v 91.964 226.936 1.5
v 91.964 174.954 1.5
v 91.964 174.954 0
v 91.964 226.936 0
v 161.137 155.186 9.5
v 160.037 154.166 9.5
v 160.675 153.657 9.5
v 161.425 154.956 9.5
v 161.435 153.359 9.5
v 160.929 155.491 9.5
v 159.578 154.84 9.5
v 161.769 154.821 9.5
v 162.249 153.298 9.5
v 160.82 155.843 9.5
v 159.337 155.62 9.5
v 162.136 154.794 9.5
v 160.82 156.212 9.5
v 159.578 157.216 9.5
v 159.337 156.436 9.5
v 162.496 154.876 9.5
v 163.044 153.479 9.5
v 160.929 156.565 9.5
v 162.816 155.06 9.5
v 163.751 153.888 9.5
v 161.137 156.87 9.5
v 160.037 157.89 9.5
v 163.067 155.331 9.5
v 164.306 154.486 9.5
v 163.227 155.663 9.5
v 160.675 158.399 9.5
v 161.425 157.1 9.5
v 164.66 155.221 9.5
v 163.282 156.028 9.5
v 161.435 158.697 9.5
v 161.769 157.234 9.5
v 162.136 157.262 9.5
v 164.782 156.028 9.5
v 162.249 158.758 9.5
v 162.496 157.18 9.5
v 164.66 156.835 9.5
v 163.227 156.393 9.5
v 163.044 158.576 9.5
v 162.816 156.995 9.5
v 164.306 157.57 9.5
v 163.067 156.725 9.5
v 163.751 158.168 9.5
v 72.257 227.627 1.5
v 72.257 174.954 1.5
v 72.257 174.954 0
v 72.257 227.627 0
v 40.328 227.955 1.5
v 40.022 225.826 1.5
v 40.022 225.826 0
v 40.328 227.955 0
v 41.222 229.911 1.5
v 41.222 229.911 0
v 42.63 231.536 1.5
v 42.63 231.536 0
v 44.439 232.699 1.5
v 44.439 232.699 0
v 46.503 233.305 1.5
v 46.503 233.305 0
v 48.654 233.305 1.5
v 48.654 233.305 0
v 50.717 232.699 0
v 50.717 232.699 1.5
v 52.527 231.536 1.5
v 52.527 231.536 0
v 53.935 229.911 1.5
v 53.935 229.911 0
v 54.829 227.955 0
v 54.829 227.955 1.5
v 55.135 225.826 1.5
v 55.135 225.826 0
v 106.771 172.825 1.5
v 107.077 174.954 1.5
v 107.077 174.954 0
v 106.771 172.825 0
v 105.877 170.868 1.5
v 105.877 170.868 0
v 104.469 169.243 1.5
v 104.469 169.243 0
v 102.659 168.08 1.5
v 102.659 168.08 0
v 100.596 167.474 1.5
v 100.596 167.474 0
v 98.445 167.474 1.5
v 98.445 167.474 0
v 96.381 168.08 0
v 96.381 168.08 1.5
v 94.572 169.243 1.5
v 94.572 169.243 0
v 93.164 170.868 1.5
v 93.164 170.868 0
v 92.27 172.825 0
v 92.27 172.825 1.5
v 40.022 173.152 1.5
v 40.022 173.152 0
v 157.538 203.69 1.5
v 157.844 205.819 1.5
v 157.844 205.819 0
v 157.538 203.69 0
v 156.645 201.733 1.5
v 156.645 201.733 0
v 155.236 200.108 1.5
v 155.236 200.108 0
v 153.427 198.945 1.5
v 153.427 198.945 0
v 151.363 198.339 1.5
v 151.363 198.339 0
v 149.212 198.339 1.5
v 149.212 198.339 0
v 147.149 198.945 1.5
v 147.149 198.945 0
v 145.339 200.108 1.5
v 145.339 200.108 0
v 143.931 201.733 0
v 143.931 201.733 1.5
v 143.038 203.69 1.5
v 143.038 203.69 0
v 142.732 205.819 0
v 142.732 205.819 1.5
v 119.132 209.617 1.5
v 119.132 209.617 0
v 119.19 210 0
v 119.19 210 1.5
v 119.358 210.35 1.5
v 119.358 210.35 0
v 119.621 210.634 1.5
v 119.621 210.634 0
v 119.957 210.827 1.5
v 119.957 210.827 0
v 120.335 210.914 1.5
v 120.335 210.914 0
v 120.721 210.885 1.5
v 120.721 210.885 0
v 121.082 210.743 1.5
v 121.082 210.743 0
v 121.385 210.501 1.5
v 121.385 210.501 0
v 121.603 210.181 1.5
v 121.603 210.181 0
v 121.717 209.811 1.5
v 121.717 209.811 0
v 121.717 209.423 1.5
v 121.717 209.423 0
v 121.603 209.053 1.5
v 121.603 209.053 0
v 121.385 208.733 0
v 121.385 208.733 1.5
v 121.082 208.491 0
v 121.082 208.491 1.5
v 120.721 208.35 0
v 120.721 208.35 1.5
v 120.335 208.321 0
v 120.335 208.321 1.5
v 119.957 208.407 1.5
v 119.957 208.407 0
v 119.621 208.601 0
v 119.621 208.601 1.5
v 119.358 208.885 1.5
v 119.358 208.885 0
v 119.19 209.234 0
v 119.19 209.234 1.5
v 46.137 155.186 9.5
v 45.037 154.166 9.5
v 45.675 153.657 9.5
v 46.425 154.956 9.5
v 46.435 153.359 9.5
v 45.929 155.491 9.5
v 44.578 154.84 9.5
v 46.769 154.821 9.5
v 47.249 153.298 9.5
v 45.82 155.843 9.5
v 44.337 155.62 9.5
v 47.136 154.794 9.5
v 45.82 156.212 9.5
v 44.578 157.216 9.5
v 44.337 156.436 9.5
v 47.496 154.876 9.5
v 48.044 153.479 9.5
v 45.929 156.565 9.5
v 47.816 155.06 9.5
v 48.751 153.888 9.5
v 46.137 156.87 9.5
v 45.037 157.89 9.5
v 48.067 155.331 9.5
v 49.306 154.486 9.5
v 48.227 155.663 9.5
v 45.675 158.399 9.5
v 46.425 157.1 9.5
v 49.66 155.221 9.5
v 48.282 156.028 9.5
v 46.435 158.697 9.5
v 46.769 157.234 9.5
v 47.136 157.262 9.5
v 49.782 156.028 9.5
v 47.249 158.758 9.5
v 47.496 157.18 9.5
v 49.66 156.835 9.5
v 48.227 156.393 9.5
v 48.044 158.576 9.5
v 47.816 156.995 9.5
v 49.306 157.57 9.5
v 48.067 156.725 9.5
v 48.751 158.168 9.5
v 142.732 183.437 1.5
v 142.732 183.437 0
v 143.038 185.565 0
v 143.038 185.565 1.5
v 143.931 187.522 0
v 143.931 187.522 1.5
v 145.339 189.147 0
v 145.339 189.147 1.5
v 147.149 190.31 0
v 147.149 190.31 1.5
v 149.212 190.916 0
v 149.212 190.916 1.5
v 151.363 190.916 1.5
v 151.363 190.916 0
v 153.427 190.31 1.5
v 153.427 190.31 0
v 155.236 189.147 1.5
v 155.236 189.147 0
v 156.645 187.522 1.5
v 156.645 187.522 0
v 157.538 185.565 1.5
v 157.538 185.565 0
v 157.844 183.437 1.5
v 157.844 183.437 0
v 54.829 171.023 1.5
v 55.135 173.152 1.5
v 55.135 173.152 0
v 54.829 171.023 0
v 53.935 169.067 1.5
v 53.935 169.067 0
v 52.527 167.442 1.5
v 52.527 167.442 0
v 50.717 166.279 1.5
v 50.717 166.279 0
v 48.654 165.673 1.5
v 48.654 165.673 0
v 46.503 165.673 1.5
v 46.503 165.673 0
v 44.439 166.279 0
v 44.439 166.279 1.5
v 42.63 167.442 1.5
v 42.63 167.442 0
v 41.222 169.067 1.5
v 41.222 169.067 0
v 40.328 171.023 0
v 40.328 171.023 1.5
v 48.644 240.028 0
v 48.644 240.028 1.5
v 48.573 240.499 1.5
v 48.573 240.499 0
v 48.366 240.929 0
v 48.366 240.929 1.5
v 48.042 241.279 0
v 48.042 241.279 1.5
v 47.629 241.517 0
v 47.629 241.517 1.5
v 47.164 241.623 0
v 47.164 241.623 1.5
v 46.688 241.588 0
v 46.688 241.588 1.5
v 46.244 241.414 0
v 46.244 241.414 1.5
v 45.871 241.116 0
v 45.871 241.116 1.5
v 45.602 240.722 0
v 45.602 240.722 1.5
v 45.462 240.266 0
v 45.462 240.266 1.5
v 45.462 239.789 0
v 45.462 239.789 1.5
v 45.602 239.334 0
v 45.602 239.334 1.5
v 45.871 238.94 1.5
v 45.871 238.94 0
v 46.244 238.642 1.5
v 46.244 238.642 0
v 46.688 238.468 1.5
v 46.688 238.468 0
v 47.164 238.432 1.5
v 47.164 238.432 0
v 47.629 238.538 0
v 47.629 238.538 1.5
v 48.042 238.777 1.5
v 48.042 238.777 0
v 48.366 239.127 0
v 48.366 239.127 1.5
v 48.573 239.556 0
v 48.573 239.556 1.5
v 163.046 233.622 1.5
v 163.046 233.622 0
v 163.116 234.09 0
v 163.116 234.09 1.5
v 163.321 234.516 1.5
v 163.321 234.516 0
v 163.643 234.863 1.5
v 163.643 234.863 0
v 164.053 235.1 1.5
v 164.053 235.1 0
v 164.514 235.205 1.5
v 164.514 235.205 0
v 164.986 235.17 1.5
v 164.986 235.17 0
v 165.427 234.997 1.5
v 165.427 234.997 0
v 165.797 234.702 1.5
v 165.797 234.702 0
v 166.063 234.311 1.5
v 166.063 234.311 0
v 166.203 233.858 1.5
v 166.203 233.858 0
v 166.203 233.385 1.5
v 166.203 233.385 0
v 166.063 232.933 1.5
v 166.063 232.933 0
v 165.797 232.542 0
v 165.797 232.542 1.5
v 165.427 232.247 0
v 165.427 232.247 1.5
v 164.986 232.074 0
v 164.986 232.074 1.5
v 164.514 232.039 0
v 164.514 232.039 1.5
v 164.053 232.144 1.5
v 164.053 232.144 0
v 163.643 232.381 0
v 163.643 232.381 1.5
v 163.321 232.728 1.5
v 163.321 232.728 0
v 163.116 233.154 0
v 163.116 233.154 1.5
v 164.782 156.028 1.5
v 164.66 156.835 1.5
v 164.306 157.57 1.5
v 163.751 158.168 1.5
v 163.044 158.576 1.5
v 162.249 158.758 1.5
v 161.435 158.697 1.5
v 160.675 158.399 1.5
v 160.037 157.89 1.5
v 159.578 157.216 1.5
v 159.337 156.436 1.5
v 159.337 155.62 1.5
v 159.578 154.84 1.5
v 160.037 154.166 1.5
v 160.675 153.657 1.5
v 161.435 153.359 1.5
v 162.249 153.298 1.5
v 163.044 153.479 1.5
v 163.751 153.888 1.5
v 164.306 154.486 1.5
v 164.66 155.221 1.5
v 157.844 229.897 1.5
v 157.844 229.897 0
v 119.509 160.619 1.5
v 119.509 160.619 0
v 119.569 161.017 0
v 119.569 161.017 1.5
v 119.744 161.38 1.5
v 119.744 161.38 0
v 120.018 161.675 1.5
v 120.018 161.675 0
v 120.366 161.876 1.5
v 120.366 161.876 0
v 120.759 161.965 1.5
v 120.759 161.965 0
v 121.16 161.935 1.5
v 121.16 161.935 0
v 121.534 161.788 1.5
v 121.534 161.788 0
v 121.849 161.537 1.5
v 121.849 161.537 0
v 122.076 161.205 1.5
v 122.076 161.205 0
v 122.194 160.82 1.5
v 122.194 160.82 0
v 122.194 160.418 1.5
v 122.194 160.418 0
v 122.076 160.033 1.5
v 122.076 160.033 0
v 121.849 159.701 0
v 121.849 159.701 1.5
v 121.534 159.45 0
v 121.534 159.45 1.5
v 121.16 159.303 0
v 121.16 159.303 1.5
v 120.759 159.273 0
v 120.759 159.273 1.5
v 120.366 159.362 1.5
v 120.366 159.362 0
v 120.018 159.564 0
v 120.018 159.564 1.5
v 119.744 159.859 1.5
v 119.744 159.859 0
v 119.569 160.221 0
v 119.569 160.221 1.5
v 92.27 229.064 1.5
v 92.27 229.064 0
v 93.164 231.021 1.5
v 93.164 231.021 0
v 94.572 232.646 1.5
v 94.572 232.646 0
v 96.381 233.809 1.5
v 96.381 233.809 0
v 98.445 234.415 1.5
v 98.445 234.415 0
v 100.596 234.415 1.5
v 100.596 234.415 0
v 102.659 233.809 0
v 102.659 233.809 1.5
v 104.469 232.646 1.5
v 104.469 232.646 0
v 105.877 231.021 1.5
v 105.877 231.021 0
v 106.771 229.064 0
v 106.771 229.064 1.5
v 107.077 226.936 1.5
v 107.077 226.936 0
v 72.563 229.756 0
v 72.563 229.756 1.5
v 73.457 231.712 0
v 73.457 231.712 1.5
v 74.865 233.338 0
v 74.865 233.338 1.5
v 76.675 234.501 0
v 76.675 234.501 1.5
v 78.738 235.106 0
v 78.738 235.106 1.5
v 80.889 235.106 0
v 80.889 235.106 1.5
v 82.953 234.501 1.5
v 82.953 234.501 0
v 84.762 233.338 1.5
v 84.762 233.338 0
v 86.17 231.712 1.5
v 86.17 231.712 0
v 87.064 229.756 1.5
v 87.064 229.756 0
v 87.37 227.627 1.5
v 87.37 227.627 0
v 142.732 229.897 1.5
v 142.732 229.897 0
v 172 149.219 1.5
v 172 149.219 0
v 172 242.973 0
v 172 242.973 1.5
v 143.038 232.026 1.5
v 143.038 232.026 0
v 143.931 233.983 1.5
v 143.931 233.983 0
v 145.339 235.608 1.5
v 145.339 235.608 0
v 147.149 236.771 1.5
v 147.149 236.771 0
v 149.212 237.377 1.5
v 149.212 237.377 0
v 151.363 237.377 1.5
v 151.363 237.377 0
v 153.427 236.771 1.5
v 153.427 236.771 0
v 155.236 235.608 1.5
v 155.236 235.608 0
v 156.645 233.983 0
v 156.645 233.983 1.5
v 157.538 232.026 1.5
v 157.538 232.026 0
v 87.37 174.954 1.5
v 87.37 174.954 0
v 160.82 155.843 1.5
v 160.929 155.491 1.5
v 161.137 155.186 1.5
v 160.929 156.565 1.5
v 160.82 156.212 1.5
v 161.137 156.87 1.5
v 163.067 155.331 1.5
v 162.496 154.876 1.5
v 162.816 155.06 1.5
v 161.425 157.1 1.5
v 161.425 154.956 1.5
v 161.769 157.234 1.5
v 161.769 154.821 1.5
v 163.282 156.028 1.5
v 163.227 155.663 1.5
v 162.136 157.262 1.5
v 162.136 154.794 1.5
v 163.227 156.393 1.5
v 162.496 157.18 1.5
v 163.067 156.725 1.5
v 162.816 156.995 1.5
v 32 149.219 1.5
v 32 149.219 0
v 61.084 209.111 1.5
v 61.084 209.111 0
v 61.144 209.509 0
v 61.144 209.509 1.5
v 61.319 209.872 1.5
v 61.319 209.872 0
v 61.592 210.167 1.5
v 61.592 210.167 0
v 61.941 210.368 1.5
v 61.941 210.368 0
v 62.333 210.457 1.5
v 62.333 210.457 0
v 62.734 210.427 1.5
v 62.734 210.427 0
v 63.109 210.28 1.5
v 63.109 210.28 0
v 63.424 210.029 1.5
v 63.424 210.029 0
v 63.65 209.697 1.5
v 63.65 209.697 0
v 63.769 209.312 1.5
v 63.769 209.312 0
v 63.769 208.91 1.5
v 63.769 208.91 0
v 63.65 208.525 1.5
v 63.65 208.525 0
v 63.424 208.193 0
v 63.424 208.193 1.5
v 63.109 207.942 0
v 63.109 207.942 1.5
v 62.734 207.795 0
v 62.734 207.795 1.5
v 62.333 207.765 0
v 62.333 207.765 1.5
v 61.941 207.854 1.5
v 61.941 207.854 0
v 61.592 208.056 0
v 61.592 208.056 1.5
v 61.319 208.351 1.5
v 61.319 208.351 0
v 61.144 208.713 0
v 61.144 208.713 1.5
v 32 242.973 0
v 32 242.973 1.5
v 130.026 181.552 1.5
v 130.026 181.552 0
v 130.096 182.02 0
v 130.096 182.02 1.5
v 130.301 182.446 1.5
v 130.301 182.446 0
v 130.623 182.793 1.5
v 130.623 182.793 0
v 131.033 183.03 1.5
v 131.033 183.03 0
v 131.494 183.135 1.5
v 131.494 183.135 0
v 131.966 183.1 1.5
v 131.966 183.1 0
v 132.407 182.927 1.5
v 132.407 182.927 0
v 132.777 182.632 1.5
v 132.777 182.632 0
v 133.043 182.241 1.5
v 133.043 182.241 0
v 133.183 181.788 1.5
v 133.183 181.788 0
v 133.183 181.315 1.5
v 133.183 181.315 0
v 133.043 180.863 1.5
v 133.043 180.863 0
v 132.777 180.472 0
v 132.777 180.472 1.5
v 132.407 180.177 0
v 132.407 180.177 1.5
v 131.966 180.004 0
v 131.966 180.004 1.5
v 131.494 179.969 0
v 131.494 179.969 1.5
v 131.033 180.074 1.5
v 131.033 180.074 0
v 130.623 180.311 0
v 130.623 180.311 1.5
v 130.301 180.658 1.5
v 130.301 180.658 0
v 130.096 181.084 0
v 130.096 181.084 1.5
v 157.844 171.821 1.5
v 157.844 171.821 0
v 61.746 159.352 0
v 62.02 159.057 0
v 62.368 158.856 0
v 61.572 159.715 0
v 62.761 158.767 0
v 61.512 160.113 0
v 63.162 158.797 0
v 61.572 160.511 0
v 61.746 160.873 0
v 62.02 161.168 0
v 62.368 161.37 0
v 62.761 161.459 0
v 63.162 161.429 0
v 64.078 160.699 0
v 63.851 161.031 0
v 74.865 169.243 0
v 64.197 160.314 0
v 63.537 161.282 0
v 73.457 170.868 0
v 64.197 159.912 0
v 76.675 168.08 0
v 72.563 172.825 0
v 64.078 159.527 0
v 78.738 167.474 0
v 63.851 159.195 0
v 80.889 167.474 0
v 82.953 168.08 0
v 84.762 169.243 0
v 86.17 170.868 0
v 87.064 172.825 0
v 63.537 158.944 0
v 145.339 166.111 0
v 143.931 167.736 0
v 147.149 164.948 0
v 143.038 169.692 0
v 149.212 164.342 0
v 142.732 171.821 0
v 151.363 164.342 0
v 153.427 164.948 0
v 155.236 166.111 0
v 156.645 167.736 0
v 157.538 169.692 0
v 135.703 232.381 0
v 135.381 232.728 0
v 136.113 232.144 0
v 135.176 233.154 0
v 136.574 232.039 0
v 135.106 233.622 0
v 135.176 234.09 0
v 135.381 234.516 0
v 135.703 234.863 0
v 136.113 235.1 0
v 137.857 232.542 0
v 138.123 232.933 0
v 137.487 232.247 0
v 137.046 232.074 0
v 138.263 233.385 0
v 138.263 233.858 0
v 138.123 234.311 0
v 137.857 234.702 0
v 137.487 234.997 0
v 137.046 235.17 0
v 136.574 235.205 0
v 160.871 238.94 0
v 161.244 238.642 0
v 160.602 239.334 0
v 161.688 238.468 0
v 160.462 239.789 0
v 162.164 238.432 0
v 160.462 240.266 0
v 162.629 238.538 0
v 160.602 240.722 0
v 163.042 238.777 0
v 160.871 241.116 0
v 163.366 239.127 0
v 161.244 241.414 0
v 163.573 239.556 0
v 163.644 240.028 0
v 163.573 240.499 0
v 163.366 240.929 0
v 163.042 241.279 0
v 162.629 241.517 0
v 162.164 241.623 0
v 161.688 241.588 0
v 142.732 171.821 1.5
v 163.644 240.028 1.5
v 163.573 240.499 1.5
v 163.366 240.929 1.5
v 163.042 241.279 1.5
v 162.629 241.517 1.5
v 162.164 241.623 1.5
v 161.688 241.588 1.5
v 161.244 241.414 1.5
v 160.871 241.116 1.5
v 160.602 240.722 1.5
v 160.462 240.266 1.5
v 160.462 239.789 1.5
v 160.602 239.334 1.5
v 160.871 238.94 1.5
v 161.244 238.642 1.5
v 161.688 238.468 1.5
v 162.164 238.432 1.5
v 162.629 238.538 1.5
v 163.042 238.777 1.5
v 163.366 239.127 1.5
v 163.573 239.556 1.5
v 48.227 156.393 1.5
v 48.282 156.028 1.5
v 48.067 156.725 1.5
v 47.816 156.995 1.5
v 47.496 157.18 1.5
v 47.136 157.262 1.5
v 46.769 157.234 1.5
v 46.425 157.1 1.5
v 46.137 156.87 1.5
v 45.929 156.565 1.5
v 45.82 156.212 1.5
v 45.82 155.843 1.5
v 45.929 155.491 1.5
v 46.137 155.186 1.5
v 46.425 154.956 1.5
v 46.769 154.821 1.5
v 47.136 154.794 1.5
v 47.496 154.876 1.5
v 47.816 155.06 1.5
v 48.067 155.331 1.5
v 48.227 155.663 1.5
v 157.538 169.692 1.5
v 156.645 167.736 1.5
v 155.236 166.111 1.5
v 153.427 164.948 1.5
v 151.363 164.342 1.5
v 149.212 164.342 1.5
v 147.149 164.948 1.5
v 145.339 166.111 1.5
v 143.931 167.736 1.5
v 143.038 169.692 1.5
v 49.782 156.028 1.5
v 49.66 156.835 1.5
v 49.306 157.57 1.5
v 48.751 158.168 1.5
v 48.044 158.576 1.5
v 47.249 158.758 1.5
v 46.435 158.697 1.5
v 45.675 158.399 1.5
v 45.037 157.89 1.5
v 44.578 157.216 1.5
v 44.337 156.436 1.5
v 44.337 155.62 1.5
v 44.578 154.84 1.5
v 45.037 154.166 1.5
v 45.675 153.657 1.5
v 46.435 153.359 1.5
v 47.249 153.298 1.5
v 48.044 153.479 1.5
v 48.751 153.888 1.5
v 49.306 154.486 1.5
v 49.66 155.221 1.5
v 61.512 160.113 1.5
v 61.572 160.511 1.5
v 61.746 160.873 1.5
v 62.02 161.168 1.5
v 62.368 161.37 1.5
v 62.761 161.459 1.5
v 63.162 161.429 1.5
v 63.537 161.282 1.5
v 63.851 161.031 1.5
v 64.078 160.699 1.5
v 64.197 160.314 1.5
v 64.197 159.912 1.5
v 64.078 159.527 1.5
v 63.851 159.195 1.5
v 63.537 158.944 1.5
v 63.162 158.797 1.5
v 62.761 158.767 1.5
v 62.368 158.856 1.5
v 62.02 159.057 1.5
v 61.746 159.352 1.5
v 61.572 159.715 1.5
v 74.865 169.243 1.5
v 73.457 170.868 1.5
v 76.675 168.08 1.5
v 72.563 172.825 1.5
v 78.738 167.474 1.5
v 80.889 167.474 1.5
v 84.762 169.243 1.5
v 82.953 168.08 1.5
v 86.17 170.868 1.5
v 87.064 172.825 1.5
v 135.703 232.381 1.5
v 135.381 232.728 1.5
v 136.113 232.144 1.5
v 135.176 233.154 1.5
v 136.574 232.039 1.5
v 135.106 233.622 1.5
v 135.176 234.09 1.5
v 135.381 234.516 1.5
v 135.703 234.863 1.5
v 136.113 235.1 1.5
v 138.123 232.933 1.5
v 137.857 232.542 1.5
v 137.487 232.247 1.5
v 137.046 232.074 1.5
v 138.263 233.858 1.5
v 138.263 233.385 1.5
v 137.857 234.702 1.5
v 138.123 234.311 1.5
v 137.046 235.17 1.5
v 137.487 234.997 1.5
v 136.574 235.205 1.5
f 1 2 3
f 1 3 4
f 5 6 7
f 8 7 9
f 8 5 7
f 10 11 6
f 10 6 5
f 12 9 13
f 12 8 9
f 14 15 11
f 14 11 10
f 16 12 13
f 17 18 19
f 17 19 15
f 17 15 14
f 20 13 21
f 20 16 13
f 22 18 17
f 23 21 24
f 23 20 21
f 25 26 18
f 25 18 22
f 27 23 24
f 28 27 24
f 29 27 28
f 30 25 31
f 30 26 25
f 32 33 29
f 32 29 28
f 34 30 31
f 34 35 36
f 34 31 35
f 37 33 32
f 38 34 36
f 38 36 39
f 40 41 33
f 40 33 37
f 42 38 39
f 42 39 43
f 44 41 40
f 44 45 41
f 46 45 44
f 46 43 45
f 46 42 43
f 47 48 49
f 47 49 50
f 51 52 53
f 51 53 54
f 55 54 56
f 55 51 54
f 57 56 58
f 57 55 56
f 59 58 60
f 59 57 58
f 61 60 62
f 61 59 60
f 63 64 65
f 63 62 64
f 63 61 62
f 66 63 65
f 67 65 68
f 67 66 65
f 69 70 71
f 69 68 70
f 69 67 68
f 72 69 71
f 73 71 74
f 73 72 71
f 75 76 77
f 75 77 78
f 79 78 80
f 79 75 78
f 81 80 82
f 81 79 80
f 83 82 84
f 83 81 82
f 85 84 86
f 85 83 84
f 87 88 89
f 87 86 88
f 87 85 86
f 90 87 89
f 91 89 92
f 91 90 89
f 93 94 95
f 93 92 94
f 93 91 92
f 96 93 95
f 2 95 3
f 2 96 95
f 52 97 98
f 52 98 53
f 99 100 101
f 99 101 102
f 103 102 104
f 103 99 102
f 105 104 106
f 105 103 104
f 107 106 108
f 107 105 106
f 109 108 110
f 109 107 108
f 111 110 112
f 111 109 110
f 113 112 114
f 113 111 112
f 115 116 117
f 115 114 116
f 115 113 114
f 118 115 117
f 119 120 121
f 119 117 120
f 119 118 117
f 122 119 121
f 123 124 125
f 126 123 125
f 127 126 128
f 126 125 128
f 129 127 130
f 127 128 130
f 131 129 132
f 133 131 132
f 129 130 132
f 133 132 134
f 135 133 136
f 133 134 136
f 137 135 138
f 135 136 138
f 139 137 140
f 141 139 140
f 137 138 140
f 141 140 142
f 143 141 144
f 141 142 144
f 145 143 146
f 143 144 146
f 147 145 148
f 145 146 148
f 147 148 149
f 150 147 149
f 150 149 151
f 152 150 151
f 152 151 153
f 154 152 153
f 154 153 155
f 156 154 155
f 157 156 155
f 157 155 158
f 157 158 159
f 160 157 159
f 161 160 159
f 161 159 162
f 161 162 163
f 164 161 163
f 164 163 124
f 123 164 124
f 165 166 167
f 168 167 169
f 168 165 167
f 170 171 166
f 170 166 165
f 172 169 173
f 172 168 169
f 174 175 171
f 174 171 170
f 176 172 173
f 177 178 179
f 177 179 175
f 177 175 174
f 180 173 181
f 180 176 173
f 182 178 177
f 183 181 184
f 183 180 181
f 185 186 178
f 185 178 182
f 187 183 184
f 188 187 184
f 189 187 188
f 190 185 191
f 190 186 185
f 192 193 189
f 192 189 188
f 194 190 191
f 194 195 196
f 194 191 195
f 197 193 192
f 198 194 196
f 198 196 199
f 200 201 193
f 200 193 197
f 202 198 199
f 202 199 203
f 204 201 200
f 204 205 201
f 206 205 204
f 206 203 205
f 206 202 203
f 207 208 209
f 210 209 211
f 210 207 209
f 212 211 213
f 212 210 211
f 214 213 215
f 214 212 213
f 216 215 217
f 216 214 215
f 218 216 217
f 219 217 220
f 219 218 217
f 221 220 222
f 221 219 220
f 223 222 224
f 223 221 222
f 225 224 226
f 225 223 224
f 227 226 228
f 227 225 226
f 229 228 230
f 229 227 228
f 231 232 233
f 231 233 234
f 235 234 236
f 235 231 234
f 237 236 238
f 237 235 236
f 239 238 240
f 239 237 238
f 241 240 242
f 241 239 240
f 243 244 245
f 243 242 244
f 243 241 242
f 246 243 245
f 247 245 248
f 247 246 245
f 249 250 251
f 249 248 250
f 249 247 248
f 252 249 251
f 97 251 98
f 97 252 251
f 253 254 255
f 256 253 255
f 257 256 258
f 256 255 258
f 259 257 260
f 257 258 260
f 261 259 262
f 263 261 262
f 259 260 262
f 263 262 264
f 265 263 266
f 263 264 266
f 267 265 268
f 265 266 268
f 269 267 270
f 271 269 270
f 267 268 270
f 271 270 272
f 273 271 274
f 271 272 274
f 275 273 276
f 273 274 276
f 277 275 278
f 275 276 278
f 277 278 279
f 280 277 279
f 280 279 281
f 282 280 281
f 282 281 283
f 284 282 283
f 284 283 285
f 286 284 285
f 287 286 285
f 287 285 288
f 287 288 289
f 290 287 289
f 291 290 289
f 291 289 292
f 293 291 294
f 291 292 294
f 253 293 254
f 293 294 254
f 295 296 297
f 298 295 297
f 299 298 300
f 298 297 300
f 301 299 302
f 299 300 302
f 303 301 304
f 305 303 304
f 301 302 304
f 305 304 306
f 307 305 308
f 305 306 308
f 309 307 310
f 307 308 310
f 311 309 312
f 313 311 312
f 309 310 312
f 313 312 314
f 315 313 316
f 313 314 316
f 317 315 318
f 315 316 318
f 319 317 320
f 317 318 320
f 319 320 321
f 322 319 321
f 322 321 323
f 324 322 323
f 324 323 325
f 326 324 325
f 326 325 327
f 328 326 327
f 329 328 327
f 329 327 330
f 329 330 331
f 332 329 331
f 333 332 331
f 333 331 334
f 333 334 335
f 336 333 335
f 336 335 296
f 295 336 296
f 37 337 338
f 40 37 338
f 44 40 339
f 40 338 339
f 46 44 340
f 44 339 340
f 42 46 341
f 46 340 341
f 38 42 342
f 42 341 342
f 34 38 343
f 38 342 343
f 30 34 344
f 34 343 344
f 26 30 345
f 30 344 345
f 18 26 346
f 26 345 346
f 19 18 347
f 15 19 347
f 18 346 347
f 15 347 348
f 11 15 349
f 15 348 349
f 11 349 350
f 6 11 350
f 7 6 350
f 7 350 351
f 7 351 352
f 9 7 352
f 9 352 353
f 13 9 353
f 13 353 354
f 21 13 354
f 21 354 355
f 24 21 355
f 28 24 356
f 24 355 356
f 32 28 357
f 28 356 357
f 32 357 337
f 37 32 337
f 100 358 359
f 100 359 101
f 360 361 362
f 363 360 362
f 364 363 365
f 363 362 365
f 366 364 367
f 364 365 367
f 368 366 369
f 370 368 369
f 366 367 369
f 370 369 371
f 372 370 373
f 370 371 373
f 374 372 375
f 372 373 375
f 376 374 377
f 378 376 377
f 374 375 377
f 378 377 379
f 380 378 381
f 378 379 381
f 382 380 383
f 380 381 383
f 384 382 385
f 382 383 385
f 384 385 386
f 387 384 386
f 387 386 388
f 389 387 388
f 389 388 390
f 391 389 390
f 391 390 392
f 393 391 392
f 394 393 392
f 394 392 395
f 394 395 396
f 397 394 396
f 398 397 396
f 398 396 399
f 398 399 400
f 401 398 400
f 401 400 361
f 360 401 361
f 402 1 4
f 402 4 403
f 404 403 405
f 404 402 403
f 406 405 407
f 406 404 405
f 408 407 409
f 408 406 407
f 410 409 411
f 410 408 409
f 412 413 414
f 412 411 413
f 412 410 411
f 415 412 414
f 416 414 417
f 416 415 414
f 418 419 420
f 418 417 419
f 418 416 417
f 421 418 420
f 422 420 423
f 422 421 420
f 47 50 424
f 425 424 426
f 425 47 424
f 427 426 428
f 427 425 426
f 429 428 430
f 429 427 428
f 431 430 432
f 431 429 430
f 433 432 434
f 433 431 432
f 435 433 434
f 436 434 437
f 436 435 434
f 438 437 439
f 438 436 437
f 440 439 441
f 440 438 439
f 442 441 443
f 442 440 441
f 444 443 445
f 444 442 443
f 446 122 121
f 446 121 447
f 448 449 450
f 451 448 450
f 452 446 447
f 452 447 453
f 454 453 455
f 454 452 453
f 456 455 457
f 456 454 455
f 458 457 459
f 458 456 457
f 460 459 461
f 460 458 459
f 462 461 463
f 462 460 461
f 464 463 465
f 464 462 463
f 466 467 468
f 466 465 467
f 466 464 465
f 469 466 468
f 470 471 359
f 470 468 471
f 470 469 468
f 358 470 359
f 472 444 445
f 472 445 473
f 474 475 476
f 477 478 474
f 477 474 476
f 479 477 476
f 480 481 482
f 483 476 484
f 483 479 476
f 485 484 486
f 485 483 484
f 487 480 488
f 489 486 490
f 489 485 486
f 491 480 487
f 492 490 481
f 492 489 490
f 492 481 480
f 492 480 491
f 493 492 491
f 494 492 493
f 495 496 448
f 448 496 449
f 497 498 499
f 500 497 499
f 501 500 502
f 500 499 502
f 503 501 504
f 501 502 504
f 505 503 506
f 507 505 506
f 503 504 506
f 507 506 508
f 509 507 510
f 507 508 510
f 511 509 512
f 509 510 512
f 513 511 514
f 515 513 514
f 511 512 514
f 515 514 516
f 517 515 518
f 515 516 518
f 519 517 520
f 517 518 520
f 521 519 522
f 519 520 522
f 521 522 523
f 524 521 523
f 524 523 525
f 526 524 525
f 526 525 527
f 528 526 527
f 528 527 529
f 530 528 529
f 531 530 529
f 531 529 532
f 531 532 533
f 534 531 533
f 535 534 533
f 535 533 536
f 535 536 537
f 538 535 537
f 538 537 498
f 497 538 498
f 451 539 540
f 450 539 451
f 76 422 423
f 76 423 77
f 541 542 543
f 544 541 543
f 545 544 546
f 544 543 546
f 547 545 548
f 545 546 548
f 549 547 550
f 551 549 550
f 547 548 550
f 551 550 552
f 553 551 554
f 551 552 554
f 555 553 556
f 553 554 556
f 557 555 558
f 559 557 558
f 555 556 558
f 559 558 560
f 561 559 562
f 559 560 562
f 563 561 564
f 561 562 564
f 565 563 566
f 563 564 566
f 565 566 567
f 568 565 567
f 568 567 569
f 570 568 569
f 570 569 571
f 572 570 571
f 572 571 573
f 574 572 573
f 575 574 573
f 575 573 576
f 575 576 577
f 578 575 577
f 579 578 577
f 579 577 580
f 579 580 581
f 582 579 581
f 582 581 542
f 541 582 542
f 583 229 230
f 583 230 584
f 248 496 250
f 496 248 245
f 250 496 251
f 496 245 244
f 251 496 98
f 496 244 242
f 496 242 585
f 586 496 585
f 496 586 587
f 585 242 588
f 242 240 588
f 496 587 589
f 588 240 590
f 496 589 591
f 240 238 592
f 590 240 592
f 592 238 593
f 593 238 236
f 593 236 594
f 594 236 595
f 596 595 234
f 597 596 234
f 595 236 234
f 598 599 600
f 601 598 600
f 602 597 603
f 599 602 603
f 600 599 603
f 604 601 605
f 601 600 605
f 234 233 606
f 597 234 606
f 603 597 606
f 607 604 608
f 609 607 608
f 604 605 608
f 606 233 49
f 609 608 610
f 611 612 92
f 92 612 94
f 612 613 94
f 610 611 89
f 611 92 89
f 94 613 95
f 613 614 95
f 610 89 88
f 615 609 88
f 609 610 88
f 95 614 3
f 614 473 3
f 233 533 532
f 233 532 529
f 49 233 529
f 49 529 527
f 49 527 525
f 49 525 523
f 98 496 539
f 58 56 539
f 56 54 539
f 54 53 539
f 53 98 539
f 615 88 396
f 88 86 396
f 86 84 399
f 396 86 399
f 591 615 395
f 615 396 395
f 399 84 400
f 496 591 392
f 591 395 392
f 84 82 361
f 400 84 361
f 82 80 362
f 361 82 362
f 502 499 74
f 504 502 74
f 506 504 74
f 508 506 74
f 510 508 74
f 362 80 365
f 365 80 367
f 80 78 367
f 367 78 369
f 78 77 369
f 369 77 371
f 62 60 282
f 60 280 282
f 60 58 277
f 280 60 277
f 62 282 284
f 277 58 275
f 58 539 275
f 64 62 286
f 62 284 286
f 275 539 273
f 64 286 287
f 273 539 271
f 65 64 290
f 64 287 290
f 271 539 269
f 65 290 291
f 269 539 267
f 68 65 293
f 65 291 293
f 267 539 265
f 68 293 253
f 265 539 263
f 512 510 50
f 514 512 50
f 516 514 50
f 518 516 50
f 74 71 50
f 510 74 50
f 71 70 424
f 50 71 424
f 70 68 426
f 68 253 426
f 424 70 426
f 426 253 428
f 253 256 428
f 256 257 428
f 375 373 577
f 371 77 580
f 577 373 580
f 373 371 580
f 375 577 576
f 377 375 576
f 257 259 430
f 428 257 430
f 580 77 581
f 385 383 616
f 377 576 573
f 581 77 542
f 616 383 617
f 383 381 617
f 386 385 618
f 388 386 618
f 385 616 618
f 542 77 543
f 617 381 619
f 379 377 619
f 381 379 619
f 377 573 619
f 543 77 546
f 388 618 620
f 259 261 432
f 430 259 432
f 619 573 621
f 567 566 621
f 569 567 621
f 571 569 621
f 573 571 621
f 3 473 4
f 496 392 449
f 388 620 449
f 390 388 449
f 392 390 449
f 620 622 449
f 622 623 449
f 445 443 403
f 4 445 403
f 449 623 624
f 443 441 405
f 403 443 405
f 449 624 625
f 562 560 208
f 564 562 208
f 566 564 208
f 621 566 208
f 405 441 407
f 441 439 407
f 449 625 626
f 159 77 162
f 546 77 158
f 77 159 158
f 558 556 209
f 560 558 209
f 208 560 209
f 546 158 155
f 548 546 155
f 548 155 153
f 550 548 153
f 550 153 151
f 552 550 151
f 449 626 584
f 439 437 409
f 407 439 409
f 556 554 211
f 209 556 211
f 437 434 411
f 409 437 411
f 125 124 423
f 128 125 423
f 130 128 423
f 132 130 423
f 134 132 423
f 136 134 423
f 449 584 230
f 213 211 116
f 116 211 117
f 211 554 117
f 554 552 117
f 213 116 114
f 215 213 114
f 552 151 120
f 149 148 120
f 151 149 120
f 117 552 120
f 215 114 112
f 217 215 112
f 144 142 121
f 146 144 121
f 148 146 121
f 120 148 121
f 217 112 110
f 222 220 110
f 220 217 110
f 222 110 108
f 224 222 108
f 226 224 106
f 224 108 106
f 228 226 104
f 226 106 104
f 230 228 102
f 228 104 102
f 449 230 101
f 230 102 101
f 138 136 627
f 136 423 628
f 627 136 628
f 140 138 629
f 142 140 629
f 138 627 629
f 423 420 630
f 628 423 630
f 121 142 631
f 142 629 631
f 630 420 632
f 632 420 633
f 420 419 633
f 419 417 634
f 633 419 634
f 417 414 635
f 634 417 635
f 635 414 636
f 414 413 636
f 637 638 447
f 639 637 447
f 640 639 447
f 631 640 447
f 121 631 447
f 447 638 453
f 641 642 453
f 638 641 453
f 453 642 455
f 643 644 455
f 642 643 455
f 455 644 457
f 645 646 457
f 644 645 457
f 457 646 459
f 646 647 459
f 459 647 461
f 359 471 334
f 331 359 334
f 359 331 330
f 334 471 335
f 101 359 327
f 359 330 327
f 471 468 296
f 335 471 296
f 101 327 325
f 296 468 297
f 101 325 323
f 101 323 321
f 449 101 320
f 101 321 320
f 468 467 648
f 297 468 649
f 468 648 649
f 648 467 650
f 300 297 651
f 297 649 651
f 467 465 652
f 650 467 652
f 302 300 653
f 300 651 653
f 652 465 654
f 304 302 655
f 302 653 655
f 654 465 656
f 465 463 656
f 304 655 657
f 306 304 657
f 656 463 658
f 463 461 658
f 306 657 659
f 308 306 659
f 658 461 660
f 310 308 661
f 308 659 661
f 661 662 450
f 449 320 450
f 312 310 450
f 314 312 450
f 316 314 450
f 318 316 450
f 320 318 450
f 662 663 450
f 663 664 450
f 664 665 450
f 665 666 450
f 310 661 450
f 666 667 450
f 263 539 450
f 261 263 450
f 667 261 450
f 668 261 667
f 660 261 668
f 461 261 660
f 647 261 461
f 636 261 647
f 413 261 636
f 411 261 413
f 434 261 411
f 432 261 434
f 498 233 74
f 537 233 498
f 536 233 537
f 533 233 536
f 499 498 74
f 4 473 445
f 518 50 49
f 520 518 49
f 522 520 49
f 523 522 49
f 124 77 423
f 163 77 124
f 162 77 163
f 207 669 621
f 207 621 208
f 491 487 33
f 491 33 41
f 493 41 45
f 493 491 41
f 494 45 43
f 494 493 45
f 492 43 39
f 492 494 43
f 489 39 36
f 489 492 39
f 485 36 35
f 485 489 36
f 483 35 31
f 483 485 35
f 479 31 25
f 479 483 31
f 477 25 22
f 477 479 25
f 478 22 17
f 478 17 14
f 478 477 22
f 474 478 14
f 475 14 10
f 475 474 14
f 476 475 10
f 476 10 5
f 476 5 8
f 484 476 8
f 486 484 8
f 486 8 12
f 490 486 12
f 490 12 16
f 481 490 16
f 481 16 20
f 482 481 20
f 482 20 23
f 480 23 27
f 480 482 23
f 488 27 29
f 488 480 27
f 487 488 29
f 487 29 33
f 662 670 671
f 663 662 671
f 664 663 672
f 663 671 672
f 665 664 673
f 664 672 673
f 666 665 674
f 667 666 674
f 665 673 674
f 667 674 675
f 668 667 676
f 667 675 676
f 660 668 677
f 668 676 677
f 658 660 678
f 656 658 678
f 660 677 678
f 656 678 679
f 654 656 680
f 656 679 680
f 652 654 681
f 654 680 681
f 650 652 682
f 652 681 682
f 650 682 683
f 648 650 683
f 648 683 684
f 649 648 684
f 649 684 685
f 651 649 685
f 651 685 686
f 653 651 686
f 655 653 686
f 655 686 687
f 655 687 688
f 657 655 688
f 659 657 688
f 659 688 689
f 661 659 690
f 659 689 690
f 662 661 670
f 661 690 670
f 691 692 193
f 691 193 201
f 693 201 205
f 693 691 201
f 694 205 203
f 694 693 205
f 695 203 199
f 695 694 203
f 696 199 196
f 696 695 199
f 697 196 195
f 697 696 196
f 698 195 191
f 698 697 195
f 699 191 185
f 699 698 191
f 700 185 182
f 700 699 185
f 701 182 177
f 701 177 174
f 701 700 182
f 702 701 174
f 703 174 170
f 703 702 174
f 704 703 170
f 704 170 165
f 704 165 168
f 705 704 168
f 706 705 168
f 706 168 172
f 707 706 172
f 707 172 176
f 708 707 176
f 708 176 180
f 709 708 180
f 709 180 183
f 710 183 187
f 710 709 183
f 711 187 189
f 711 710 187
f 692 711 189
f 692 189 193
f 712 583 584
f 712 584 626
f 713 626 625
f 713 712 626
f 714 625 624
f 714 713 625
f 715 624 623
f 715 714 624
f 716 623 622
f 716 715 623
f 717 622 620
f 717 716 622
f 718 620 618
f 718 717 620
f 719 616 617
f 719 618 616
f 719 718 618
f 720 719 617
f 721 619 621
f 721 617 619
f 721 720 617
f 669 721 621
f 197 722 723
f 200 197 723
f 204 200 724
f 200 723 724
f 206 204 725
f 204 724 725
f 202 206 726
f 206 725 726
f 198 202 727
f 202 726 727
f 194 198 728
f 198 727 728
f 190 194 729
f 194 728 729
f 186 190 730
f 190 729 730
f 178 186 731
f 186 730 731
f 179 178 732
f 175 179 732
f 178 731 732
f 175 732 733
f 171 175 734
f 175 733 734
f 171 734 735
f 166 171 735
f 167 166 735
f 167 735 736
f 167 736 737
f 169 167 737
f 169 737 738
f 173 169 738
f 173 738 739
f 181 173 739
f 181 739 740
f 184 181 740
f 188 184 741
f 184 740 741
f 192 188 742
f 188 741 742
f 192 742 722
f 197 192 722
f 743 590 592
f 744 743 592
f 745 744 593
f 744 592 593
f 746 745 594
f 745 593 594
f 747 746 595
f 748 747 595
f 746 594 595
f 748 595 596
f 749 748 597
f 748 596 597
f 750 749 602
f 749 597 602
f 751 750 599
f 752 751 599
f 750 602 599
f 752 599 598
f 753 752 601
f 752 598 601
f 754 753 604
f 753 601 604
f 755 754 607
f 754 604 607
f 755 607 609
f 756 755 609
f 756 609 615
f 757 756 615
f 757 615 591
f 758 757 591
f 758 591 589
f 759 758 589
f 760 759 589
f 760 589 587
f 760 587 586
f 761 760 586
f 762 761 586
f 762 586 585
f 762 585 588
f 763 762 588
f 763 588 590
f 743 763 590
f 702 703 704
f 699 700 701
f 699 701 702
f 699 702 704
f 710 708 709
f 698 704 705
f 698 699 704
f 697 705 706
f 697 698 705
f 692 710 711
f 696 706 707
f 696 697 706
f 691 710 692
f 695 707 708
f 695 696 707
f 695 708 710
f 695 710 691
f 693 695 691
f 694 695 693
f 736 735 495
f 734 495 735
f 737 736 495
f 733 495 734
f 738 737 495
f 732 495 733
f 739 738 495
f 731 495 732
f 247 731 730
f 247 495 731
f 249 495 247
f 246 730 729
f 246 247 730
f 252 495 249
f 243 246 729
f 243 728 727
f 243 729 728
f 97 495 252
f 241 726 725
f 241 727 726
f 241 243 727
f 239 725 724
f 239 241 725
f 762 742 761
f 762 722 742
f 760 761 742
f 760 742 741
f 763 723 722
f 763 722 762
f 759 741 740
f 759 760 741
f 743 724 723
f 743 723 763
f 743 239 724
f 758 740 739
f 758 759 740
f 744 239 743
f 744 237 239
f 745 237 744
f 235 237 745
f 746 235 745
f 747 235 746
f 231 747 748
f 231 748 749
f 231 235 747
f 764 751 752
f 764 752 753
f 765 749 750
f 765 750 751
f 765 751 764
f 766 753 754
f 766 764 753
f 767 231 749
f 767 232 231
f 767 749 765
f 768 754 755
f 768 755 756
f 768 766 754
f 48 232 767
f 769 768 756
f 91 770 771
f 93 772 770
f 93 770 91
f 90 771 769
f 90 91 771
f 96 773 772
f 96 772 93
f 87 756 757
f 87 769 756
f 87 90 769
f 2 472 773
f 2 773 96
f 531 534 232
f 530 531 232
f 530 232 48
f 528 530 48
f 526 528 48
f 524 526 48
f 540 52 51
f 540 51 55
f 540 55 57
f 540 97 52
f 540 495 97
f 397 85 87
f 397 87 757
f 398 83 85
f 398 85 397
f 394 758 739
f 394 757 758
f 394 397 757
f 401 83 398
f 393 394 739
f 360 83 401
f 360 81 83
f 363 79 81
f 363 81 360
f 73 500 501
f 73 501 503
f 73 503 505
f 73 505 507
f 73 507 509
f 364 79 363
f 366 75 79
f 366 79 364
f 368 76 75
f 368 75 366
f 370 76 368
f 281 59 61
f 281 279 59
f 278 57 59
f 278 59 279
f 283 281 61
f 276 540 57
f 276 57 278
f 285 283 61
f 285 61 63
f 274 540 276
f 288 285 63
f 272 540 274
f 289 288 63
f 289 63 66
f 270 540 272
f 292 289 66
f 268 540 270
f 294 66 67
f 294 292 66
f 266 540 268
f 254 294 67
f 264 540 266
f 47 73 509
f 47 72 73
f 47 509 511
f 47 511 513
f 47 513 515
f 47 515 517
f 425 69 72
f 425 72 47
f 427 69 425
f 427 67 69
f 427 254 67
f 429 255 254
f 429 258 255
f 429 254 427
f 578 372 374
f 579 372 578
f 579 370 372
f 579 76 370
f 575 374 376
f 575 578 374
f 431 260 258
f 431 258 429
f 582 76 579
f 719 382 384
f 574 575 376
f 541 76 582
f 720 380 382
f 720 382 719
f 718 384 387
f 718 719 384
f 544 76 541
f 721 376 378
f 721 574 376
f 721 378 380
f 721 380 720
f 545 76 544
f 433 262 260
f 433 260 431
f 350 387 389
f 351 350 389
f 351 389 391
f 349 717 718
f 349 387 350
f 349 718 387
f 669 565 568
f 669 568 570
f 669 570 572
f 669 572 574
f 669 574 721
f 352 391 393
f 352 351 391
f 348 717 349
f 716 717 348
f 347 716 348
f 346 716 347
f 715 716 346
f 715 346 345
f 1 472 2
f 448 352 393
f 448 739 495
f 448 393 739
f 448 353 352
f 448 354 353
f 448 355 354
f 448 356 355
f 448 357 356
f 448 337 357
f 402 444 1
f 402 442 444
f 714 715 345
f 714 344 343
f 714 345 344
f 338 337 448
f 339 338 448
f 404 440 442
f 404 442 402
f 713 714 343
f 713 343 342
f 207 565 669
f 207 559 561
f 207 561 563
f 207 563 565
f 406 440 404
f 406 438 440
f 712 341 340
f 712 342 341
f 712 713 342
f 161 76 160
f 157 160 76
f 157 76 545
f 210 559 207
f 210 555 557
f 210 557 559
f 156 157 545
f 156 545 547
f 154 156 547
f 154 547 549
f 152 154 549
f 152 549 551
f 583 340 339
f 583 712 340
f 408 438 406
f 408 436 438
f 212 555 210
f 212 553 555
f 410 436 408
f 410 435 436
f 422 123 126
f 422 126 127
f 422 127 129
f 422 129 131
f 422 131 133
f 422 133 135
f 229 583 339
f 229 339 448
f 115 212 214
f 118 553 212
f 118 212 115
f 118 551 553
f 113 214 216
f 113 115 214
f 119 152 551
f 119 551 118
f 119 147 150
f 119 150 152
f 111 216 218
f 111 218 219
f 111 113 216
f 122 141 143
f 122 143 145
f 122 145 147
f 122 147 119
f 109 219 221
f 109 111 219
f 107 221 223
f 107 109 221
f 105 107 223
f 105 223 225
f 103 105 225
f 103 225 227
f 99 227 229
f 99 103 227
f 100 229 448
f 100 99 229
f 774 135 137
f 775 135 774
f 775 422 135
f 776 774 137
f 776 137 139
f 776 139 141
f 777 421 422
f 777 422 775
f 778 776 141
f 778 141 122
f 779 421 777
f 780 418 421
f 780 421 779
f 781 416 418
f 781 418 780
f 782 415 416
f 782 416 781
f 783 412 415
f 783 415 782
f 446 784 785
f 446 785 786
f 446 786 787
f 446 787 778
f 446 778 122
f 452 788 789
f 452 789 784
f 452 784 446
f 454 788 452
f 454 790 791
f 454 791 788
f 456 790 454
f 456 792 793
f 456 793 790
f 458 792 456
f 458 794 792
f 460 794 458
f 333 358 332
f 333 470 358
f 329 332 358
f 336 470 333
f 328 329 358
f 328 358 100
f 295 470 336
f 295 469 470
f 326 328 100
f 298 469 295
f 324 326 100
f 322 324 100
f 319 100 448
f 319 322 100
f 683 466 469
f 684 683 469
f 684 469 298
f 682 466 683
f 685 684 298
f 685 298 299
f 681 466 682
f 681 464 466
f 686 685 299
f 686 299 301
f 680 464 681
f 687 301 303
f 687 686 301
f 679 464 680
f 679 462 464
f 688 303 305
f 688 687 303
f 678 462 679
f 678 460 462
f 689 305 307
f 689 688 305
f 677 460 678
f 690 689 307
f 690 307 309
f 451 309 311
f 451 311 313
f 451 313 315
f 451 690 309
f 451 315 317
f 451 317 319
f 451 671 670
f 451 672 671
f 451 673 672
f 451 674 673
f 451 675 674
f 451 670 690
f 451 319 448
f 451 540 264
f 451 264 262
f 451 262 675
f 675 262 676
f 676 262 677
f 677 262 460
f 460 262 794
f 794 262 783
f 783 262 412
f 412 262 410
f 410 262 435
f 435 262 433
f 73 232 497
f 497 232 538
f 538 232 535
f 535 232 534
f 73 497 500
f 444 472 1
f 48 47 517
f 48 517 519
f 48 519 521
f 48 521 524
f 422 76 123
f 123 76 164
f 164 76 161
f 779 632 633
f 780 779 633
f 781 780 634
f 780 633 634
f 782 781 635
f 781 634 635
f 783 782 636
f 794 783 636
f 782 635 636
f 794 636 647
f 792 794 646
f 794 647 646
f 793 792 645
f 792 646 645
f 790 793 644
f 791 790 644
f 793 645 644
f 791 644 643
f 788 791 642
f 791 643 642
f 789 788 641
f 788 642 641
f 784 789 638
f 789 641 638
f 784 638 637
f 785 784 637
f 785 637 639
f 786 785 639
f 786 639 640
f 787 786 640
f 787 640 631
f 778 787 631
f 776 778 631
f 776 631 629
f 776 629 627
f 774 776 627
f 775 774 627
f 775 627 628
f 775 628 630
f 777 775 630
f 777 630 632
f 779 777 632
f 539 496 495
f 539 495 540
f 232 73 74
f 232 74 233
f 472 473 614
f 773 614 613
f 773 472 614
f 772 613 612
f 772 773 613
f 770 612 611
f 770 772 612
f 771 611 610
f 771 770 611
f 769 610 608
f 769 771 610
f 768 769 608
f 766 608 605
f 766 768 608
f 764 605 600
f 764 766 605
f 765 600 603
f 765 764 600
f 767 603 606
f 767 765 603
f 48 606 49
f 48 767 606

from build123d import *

# Parameters (mm, degrees)
SKETCH1_W           = 140
SKETCH1_H           = 93.753760253
BOSS_EXTRUDE1_DEPTH = 1.5
SKETCH2_R           = 1.6
CUT_EXTRUDE1_DEPTH  = 1.5
SKETCH3_R           = 2.737611944
SKETCH3_R_2         = 1.237611944
BOSS_EXTRUDE2_DEPTH = 8
SKETCH4_R           = 1.3
SKETCH4_R_2         = 1.35
SKETCH4_R_3         = 1.5875
CUT_EXTRUDE2_DEPTH  = 8
CUT_EXTRUDE3_DEPTH  = 10


with BuildPart() as part:
    # Sketch1 → Boss-Extrude1 (new body)
    with BuildSketch(Plane.XY):
        with Locations((102, 196.095777869)):
            Rectangle(SKETCH1_W, SKETCH1_H)
    extrude(amount=BOSS_EXTRUDE1_DEPTH)

    # Sketch2 → Cut-Extrude1 (cut)
    with BuildSketch(Plane.XY.offset(1.5)):
        with Locations((47.04400772, 240.027868216)):
            Circle(SKETCH2_R)
        with Locations((162.04400772, 240.027868216)):
            Circle(SKETCH2_R)
    extrude(amount=-CUT_EXTRUDE1_DEPTH, mode=Mode.SUBTRACT)

    # Sketch3 → Boss-Extrude2 (add)
    # profile 1 of 2: a face of its own
    with BuildSketch(Plane.XY.offset(1.5)):
        with Locations((47.04400772, 156.027868216)):
            Circle(SKETCH3_R)
        with Locations((47.04400772, 156.027868216)):
            Circle(SKETCH3_R_2, mode=Mode.SUBTRACT)
    # profile 2 of 2: a face of its own
    with BuildSketch(Plane.XY.offset(1.5)):
        with Locations((162.04400772, 156.027868216)):
            Circle(SKETCH3_R)
        with Locations((162.04400772, 156.027868216)):
            Circle(SKETCH3_R_2, mode=Mode.SUBTRACT)
    extrude(amount=BOSS_EXTRUDE2_DEPTH)

    # Sketch4 → Cut-Extrude2 (cut)
    with BuildSketch(Plane(origin=(0, 0, 0), x_dir=(-1, 0, 0), z_dir=(0, 0, -1))):
        with Locations((-120.431826709, 209.617216317)):
            Circle(SKETCH4_R)
        with Locations((-62.434035172, 209.111077258)):
            Circle(SKETCH4_R_2)
        with Locations((-62.861635411, 160.112943028)):
            Circle(SKETCH4_R_2)
        with Locations((-120.859426949, 160.619082087)):
            Circle(SKETCH4_R_2)
        with Locations((-131.613133958, 181.551872542)):
            Circle(SKETCH4_R_3)
        with Locations((-136.693133958, 233.621872542)):
            Circle(SKETCH4_R_3)
        with Locations((-164.633133958, 233.621872542)):
            Circle(SKETCH4_R_3)
    extrude(amount=-CUT_EXTRUDE2_DEPTH, mode=Mode.SUBTRACT)

    # Sketch5 → Cut-Extrude3 (cut)
    with BuildSketch(Plane.XY.offset(1.5)):
        with BuildLine():
            Line((87.370025241, 227.627019548), (87.370025241, 174.953532483))
            ThreePointArc((87.370025241, 174.953532483), (79.813693114, 167.397200355), (72.257360986, 174.953532483))
            Line((72.257360986, 174.953532483), (72.257360986, 227.627019548))
            ThreePointArc((72.257360986, 227.627019548), (79.813693114, 235.183351676), (87.370025241, 227.627019548))
        make_face()
        with BuildLine():
            Line((107.076686064, 226.935622361), (107.076686064, 174.953532483))
            ThreePointArc((107.076686064, 174.953532483), (99.520353936, 167.397200355), (91.964021808, 174.953532483))
            Line((91.964021808, 174.953532483), (91.964021808, 226.935622361))
            ThreePointArc((91.964021808, 226.935622361), (99.520353936, 234.491954489), (107.076686064, 226.935622361))
        make_face()
        with BuildLine():
            Line((142.731512272, 205.818600592), (142.731512272, 229.897268949))
            ThreePointArc((142.731512272, 229.897268949), (150.2878444, 237.453601077), (157.844176528, 229.897268949))
            Line((157.844176528, 229.897268949), (157.844176528, 205.818600592))
            ThreePointArc((157.844176528, 205.818600592), (150.2878444, 198.262268464), (142.731512272, 205.818600592))
        make_face()
        with BuildLine():
            Line((157.844176528, 183.436532175), (157.844176528, 171.821347981))
            ThreePointArc((157.844176528, 171.821347981), (150.2878444, 164.265015853), (142.731512272, 171.821347981))
            Line((142.731512272, 171.821347981), (142.731512272, 183.436532175))
            ThreePointArc((142.731512272, 183.436532175), (150.2878444, 190.992864302), (157.844176528, 183.436532175))
        make_face()
        with BuildLine():
            Line((55.134626412, 225.825721278), (55.134626412, 173.152234213))
            ThreePointArc((55.134626412, 173.152234213), (47.578294284, 165.595902085), (40.021962156, 173.152234213))
            Line((40.021962156, 173.152234213), (40.021962156, 225.825721278))
            ThreePointArc((40.021962156, 225.825721278), (47.578294284, 233.382053406), (55.134626412, 225.825721278))
        make_face()
    extrude(amount=-CUT_EXTRUDE3_DEPTH, mode=Mode.SUBTRACT)


solid = part.part
